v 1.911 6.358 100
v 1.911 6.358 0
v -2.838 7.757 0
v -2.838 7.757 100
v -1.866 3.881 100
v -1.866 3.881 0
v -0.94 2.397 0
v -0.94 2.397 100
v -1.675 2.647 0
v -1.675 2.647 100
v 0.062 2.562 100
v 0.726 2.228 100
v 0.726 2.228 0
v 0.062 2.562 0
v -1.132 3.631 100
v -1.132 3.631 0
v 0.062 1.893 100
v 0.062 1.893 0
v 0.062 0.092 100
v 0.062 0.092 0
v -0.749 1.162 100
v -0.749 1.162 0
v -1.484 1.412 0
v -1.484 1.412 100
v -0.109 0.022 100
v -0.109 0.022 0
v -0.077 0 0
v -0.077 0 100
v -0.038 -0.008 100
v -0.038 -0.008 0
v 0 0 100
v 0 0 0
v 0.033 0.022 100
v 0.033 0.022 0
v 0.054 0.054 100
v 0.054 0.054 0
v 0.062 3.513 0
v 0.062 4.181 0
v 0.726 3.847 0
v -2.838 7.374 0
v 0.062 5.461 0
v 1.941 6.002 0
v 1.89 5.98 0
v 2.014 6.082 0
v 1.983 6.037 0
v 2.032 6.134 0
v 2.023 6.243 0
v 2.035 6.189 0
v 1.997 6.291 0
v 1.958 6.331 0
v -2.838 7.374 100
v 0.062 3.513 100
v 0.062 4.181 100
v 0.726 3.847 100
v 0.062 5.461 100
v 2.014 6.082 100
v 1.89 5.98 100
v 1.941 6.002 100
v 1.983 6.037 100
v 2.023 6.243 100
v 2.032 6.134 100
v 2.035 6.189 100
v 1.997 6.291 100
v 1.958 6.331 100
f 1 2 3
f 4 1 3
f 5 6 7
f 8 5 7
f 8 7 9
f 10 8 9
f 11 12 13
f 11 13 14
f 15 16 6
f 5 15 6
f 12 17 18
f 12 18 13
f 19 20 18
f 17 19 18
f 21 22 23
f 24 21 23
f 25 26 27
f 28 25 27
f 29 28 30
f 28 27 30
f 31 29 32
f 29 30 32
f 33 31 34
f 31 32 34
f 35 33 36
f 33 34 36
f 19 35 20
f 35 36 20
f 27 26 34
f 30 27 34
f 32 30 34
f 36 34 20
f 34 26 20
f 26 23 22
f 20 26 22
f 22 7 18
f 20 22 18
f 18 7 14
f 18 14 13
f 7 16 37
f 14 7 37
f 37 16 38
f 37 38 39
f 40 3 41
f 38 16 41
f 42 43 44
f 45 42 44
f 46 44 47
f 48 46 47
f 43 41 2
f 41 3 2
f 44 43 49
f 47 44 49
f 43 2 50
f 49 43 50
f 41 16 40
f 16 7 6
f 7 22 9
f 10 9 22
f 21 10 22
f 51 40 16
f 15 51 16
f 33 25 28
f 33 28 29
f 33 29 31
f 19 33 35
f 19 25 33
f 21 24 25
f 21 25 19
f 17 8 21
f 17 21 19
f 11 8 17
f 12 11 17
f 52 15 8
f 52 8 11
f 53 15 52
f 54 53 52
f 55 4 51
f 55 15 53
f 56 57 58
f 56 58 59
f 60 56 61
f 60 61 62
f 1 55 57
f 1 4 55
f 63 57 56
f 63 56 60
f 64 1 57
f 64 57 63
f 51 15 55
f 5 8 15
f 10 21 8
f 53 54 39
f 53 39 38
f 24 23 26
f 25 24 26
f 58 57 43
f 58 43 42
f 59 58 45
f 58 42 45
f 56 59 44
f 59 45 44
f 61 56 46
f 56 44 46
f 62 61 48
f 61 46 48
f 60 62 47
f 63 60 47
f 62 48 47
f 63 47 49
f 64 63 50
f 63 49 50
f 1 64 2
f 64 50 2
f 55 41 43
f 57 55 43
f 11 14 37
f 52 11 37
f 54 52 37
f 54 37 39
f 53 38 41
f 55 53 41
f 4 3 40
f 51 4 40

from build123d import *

# Parameters (mm, degrees)
EXTRUDE_1_DEPTH = 100


with BuildPart() as part:
    # 草图1 → 凸台-拉伸1 (new body)
    with BuildSketch(Plane.XY):
        with BuildLine():
            Line((1.910511393, 6.357959232), (-2.838177965, 7.757123338))
            Line((-2.838177965, 7.757123338), (-2.838177965, 7.373559769))
            Line((-2.838177965, 7.373559769), (-1.131654309, 3.630979973))
            Line((-1.131654309, 3.630979973), (-1.866356806, 3.881090486))
            Line((-1.866356806, 3.881090486), (-0.940400183, 2.396674584))
            Line((-0.940400183, 2.396674584), (-1.67510268, 2.646785097))
            Line((-1.67510268, 2.646785097), (-0.749146057, 1.162369196))
            Line((-0.749146057, 1.162369196), (-1.483848554, 1.412479708))
            Line((-1.483848554, 1.412479708), (-0.109115741, 0.02218372))
            ThreePointArc((-0.109115741, 0.02218372), (0, 0), (0.061991812, 0.092495284))
            Line((0.061991812, 0.092495284), (0.061991812, 1.893178292))
            Line((0.061991812, 1.893178292), (0.725818023, 2.227560058))
            Line((0.725818023, 2.227560058), (0.061991812, 2.561941824))
            Line((0.061991812, 2.561941824), (0.061991812, 3.512604418))
            Line((0.061991812, 3.512604418), (0.725818023, 3.846986184))
            Line((0.725818023, 3.846986184), (0.061991812, 4.18136795))
            Line((0.061991812, 4.18136795), (0.061991812, 5.461024264))
            Line((0.061991812, 5.461024264), (1.89024786, 5.980114276))
            ThreePointArc((1.89024786, 5.980114276), (2.035334753, 6.161799215), (1.910511393, 6.357959232))
        make_face()
    extrude(amount=EXTRUDE_1_DEPTH)


solid = part.part
